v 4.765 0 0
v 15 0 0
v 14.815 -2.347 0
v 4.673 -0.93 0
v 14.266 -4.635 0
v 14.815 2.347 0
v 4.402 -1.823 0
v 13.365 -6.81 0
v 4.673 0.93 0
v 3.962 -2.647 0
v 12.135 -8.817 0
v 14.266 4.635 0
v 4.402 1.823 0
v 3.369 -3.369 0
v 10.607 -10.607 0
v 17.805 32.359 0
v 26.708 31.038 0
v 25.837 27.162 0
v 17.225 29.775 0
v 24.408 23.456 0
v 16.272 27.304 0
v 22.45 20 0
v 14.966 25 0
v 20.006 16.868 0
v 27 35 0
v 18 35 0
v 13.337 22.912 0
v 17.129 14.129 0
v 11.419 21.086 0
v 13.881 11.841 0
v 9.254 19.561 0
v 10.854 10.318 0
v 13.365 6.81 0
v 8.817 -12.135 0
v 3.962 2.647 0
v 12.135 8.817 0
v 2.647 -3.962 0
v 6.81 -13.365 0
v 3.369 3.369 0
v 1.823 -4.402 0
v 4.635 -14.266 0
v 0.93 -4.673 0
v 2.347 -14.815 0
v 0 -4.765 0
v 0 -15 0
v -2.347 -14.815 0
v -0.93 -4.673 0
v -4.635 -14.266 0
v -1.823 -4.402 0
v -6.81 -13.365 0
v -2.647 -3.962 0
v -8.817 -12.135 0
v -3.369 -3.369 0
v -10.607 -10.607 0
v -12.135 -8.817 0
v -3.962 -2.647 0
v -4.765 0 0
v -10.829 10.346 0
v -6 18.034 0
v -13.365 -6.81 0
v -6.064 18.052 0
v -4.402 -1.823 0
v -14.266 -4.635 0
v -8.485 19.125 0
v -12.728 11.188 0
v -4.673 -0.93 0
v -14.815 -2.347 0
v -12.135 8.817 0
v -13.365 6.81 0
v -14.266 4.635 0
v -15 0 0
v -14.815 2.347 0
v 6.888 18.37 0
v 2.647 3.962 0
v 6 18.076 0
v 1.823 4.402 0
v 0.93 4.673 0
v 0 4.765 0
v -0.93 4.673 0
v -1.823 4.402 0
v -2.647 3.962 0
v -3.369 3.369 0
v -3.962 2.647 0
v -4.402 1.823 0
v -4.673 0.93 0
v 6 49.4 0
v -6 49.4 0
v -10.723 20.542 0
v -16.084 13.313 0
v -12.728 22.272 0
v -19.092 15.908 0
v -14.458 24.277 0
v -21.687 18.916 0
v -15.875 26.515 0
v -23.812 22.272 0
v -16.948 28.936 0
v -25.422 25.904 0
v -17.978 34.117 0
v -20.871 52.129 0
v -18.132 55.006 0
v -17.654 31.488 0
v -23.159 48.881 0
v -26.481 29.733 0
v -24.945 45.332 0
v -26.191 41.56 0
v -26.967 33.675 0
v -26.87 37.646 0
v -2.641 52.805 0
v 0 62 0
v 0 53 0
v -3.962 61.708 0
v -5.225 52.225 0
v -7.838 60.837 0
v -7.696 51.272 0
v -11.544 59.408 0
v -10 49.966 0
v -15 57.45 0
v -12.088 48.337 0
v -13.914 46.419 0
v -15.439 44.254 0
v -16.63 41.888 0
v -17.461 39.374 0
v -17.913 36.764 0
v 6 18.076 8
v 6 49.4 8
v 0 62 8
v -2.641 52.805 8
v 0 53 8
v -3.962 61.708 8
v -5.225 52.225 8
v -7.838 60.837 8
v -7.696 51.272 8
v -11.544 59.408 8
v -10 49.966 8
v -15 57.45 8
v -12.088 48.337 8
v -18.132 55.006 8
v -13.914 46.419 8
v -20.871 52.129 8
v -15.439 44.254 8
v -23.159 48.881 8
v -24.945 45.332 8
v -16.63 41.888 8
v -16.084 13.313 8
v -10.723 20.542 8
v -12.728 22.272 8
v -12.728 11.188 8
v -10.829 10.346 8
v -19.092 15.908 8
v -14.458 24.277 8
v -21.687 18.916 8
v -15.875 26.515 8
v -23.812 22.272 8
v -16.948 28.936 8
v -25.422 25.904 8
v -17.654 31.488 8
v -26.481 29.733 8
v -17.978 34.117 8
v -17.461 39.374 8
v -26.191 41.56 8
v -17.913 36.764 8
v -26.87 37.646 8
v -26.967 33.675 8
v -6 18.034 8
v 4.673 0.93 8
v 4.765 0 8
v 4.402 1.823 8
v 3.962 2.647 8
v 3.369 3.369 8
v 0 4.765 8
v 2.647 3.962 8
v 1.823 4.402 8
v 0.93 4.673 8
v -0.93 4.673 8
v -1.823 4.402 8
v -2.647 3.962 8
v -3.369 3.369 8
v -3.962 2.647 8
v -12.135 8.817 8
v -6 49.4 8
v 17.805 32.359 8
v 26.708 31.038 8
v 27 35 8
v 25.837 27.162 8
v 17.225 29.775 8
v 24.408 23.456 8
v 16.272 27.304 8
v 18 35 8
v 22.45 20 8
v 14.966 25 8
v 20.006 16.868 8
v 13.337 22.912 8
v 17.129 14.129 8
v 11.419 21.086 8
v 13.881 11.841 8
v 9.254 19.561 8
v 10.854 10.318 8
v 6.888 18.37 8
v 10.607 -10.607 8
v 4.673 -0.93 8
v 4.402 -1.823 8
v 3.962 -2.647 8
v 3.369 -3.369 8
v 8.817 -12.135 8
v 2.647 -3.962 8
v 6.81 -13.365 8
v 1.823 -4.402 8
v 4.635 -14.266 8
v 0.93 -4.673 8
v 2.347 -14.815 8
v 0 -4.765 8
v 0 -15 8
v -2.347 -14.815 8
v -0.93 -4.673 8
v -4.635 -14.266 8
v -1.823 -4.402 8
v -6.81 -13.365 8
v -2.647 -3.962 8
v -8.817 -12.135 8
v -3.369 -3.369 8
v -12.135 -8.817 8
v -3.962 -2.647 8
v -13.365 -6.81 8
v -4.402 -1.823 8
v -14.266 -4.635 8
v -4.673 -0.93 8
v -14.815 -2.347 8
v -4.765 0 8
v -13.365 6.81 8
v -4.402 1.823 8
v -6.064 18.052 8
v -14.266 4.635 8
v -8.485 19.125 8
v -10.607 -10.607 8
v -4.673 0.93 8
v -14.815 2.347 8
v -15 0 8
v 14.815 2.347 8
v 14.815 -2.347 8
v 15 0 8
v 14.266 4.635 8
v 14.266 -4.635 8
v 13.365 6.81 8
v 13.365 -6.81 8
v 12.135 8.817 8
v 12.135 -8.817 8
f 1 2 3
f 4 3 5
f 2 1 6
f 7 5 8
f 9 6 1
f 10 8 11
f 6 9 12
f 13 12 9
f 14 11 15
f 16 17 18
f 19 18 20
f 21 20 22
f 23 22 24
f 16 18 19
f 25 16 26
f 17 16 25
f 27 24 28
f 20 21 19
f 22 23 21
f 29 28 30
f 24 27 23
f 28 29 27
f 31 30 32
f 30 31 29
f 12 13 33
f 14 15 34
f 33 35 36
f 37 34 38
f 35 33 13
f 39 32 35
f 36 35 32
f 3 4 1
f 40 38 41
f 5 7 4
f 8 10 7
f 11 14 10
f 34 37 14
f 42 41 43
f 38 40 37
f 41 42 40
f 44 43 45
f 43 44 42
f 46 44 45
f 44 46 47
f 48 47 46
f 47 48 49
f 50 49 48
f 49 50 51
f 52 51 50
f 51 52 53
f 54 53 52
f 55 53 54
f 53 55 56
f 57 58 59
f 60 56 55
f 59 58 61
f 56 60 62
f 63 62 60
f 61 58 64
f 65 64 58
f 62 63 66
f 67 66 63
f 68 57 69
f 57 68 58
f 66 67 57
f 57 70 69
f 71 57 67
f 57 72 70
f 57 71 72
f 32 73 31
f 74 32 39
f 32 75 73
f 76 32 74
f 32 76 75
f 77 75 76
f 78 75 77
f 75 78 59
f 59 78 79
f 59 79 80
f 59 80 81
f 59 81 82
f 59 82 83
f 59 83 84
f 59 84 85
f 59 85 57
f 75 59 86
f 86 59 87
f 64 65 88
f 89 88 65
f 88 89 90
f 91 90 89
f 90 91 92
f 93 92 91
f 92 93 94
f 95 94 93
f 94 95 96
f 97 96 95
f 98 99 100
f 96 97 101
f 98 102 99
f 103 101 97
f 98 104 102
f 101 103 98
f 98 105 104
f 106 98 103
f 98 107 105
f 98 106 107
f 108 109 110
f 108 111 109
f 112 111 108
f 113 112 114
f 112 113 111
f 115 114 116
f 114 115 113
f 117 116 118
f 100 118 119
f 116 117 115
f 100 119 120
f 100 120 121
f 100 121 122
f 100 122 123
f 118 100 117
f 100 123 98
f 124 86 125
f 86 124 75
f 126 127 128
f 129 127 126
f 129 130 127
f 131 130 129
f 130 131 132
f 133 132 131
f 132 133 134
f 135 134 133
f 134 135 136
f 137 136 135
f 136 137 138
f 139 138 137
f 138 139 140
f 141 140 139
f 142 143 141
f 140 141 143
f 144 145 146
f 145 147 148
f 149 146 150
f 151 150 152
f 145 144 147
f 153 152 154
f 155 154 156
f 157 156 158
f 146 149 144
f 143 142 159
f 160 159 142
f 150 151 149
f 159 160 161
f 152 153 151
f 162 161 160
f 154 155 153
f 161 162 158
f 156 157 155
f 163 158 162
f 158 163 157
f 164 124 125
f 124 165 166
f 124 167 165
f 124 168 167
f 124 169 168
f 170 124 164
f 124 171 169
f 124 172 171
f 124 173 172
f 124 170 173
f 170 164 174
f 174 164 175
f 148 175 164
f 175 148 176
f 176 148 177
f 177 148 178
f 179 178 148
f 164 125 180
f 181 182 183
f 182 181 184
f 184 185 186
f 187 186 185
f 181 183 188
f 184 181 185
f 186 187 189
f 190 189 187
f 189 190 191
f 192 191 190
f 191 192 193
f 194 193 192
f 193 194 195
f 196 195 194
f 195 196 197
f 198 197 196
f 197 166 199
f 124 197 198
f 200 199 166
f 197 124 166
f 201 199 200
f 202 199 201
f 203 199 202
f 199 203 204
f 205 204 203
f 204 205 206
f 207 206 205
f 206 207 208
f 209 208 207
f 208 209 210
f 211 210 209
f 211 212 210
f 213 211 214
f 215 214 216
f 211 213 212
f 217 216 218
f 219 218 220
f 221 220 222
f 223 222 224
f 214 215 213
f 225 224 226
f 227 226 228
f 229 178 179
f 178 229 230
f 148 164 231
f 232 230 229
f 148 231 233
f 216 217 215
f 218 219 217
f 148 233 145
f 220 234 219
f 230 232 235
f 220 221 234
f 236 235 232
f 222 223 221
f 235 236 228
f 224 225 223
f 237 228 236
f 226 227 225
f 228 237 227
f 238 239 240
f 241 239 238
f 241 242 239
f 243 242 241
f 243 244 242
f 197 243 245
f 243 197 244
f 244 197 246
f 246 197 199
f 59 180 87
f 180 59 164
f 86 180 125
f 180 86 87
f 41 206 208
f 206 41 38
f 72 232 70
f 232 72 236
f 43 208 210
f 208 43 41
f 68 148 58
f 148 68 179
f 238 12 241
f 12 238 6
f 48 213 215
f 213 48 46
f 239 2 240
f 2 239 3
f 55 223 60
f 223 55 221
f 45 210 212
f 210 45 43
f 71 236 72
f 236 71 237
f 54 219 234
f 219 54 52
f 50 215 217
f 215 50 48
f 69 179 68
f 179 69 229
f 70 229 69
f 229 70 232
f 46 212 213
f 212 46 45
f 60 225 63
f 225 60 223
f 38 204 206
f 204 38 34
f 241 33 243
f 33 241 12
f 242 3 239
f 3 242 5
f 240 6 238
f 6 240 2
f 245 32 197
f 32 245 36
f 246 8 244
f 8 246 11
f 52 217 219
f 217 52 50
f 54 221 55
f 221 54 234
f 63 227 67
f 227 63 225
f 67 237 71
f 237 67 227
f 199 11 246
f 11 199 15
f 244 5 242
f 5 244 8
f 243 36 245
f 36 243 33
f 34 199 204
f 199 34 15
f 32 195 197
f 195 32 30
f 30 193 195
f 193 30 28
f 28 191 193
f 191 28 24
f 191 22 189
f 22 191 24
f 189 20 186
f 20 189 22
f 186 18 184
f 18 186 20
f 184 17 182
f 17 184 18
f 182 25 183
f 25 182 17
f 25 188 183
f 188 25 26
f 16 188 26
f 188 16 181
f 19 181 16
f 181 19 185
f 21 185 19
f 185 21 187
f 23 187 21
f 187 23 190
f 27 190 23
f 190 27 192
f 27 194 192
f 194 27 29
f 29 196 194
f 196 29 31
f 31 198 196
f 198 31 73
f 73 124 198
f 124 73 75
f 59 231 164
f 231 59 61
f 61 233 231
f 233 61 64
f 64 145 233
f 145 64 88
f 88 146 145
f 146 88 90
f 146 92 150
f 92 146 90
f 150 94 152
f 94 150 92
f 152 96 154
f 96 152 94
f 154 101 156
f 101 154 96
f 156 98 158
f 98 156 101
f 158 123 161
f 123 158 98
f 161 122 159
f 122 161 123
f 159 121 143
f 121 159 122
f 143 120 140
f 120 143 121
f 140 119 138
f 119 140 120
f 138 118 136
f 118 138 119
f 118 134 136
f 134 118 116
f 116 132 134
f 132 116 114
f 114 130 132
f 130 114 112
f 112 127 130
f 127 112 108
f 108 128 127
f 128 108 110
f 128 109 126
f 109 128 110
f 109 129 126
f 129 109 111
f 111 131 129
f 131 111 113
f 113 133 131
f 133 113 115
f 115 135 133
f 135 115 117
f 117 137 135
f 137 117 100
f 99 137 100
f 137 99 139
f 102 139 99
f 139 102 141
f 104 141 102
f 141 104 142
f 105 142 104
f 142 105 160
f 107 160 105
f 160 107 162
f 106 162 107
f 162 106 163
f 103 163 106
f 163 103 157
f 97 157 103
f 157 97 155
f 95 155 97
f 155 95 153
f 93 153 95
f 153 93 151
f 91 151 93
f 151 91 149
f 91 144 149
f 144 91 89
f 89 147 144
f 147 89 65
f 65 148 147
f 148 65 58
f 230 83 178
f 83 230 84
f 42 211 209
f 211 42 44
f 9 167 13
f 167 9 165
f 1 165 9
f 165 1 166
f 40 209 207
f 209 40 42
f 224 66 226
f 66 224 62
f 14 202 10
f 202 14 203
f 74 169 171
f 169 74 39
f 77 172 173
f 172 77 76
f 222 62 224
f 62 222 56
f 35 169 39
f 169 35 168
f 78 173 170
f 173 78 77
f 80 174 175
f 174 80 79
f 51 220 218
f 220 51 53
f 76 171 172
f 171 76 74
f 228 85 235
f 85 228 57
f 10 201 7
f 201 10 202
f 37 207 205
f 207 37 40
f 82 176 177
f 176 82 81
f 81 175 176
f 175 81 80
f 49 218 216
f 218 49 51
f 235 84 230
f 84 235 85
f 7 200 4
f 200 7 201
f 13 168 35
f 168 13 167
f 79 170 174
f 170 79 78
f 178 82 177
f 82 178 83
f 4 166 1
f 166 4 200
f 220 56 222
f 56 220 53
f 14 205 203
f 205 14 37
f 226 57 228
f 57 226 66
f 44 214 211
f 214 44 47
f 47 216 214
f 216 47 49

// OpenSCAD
$fn = 32;

// ----------------------------------------------------------------------
// Hook: 70 mm shank into a 18 mm curl, 8 mm thick
// ----------------------------------------------------------------------

// --- parameters (mm) ---
shank_len = 70;           // shank length from the boss centre
shank_w = 12;             // shank width
boss_d = 30;              // boss diameter
bore_d = 9.53;            // boss bore
curl_in = 18;             // curl inner radius
curl_out = 27;            // curl outer radius
curl_sweep = 270;         // curl sweep angle
hook_t = 8;               // hook thickness

shank_profile = [[-6, 49.4], [6, 49.4], [6, 13], [-6, 13]];
boss_profile = [[15, 0], [14.815, 2.347], [14.266, 4.635], [13.365, 6.81], [12.135, 8.817], [10.607, 10.607], [8.817, 12.135], [6.81, 13.365], [4.635, 14.266], [2.347, 14.815], [0, 15], [-2.347, 14.815], [-4.635, 14.266], [-6.81, 13.365], [-8.817, 12.135], [-10.607, 10.607], [-12.135, 8.817], [-13.365, 6.81], [-14.266, 4.635], [-14.815, 2.347], [-15, 0], [-14.815, -2.347], [-14.266, -4.635], [-13.365, -6.81], [-12.135, -8.817], [-10.607, -10.607], [-8.817, -12.135], [-6.81, -13.365], [-4.635, -14.266], [-2.347, -14.815], [0, -15], [2.347, -14.815], [4.635, -14.266], [6.81, -13.365], [8.817, -12.135], [10.607, -10.607], [12.135, -8.817], [13.365, -6.81], [14.266, -4.635], [14.815, -2.347]];
curl_profile = [[0, 62], [-3.962, 61.708], [-7.838, 60.837], [-11.544, 59.408], [-15, 57.45], [-18.132, 55.006], [-20.871, 52.129], [-23.159, 48.881], [-24.945, 45.332], [-26.191, 41.56], [-26.87, 37.646], [-26.967, 33.675], [-26.481, 29.733], [-25.422, 25.904], [-23.812, 22.272], [-21.687, 18.916], [-19.092, 15.908], [-16.084, 13.313], [-12.728, 11.188], [-9.096, 9.578], [-5.267, 8.519], [-1.325, 8.033], [2.646, 8.13], [6.56, 8.809], [10.332, 10.055], [13.881, 11.841], [17.129, 14.129], [20.006, 16.868], [22.45, 20], [24.408, 23.456], [25.837, 27.162], [26.708, 31.038], [27, 35], [18, 35], [17.805, 32.359], [17.225, 29.775], [16.272, 27.304], [14.966, 25], [13.337, 22.912], [11.419, 21.086], [9.254, 19.561], [6.888, 18.37], [4.374, 17.539], [1.764, 17.087], [-0.883, 17.022], [-3.512, 17.346], [-6.064, 18.052], [-8.485, 19.125], [-10.723, 20.542], [-12.728, 22.272], [-14.458, 24.277], [-15.875, 26.515], [-16.948, 28.936], [-17.654, 31.488], [-17.978, 34.117], [-17.913, 36.764], [-17.461, 39.374], [-16.63, 41.888], [-15.439, 44.254], [-13.914, 46.419], [-12.088, 48.337], [-10, 49.966], [-7.696, 51.272], [-5.225, 52.225], [-2.641, 52.805], [0, 53]];

difference() {
  union() {
    /* three overlapping outlines: shank, boss and the smooth curl */
    linear_extrude(height = hook_t) polygon(shank_profile);
    linear_extrude(height = hook_t) polygon(boss_profile);
    linear_extrude(height = hook_t) polygon(curl_profile);
  }
  translate([0, 0, -2.5]) cylinder(h = hook_t + 5, d = bore_d);
}
